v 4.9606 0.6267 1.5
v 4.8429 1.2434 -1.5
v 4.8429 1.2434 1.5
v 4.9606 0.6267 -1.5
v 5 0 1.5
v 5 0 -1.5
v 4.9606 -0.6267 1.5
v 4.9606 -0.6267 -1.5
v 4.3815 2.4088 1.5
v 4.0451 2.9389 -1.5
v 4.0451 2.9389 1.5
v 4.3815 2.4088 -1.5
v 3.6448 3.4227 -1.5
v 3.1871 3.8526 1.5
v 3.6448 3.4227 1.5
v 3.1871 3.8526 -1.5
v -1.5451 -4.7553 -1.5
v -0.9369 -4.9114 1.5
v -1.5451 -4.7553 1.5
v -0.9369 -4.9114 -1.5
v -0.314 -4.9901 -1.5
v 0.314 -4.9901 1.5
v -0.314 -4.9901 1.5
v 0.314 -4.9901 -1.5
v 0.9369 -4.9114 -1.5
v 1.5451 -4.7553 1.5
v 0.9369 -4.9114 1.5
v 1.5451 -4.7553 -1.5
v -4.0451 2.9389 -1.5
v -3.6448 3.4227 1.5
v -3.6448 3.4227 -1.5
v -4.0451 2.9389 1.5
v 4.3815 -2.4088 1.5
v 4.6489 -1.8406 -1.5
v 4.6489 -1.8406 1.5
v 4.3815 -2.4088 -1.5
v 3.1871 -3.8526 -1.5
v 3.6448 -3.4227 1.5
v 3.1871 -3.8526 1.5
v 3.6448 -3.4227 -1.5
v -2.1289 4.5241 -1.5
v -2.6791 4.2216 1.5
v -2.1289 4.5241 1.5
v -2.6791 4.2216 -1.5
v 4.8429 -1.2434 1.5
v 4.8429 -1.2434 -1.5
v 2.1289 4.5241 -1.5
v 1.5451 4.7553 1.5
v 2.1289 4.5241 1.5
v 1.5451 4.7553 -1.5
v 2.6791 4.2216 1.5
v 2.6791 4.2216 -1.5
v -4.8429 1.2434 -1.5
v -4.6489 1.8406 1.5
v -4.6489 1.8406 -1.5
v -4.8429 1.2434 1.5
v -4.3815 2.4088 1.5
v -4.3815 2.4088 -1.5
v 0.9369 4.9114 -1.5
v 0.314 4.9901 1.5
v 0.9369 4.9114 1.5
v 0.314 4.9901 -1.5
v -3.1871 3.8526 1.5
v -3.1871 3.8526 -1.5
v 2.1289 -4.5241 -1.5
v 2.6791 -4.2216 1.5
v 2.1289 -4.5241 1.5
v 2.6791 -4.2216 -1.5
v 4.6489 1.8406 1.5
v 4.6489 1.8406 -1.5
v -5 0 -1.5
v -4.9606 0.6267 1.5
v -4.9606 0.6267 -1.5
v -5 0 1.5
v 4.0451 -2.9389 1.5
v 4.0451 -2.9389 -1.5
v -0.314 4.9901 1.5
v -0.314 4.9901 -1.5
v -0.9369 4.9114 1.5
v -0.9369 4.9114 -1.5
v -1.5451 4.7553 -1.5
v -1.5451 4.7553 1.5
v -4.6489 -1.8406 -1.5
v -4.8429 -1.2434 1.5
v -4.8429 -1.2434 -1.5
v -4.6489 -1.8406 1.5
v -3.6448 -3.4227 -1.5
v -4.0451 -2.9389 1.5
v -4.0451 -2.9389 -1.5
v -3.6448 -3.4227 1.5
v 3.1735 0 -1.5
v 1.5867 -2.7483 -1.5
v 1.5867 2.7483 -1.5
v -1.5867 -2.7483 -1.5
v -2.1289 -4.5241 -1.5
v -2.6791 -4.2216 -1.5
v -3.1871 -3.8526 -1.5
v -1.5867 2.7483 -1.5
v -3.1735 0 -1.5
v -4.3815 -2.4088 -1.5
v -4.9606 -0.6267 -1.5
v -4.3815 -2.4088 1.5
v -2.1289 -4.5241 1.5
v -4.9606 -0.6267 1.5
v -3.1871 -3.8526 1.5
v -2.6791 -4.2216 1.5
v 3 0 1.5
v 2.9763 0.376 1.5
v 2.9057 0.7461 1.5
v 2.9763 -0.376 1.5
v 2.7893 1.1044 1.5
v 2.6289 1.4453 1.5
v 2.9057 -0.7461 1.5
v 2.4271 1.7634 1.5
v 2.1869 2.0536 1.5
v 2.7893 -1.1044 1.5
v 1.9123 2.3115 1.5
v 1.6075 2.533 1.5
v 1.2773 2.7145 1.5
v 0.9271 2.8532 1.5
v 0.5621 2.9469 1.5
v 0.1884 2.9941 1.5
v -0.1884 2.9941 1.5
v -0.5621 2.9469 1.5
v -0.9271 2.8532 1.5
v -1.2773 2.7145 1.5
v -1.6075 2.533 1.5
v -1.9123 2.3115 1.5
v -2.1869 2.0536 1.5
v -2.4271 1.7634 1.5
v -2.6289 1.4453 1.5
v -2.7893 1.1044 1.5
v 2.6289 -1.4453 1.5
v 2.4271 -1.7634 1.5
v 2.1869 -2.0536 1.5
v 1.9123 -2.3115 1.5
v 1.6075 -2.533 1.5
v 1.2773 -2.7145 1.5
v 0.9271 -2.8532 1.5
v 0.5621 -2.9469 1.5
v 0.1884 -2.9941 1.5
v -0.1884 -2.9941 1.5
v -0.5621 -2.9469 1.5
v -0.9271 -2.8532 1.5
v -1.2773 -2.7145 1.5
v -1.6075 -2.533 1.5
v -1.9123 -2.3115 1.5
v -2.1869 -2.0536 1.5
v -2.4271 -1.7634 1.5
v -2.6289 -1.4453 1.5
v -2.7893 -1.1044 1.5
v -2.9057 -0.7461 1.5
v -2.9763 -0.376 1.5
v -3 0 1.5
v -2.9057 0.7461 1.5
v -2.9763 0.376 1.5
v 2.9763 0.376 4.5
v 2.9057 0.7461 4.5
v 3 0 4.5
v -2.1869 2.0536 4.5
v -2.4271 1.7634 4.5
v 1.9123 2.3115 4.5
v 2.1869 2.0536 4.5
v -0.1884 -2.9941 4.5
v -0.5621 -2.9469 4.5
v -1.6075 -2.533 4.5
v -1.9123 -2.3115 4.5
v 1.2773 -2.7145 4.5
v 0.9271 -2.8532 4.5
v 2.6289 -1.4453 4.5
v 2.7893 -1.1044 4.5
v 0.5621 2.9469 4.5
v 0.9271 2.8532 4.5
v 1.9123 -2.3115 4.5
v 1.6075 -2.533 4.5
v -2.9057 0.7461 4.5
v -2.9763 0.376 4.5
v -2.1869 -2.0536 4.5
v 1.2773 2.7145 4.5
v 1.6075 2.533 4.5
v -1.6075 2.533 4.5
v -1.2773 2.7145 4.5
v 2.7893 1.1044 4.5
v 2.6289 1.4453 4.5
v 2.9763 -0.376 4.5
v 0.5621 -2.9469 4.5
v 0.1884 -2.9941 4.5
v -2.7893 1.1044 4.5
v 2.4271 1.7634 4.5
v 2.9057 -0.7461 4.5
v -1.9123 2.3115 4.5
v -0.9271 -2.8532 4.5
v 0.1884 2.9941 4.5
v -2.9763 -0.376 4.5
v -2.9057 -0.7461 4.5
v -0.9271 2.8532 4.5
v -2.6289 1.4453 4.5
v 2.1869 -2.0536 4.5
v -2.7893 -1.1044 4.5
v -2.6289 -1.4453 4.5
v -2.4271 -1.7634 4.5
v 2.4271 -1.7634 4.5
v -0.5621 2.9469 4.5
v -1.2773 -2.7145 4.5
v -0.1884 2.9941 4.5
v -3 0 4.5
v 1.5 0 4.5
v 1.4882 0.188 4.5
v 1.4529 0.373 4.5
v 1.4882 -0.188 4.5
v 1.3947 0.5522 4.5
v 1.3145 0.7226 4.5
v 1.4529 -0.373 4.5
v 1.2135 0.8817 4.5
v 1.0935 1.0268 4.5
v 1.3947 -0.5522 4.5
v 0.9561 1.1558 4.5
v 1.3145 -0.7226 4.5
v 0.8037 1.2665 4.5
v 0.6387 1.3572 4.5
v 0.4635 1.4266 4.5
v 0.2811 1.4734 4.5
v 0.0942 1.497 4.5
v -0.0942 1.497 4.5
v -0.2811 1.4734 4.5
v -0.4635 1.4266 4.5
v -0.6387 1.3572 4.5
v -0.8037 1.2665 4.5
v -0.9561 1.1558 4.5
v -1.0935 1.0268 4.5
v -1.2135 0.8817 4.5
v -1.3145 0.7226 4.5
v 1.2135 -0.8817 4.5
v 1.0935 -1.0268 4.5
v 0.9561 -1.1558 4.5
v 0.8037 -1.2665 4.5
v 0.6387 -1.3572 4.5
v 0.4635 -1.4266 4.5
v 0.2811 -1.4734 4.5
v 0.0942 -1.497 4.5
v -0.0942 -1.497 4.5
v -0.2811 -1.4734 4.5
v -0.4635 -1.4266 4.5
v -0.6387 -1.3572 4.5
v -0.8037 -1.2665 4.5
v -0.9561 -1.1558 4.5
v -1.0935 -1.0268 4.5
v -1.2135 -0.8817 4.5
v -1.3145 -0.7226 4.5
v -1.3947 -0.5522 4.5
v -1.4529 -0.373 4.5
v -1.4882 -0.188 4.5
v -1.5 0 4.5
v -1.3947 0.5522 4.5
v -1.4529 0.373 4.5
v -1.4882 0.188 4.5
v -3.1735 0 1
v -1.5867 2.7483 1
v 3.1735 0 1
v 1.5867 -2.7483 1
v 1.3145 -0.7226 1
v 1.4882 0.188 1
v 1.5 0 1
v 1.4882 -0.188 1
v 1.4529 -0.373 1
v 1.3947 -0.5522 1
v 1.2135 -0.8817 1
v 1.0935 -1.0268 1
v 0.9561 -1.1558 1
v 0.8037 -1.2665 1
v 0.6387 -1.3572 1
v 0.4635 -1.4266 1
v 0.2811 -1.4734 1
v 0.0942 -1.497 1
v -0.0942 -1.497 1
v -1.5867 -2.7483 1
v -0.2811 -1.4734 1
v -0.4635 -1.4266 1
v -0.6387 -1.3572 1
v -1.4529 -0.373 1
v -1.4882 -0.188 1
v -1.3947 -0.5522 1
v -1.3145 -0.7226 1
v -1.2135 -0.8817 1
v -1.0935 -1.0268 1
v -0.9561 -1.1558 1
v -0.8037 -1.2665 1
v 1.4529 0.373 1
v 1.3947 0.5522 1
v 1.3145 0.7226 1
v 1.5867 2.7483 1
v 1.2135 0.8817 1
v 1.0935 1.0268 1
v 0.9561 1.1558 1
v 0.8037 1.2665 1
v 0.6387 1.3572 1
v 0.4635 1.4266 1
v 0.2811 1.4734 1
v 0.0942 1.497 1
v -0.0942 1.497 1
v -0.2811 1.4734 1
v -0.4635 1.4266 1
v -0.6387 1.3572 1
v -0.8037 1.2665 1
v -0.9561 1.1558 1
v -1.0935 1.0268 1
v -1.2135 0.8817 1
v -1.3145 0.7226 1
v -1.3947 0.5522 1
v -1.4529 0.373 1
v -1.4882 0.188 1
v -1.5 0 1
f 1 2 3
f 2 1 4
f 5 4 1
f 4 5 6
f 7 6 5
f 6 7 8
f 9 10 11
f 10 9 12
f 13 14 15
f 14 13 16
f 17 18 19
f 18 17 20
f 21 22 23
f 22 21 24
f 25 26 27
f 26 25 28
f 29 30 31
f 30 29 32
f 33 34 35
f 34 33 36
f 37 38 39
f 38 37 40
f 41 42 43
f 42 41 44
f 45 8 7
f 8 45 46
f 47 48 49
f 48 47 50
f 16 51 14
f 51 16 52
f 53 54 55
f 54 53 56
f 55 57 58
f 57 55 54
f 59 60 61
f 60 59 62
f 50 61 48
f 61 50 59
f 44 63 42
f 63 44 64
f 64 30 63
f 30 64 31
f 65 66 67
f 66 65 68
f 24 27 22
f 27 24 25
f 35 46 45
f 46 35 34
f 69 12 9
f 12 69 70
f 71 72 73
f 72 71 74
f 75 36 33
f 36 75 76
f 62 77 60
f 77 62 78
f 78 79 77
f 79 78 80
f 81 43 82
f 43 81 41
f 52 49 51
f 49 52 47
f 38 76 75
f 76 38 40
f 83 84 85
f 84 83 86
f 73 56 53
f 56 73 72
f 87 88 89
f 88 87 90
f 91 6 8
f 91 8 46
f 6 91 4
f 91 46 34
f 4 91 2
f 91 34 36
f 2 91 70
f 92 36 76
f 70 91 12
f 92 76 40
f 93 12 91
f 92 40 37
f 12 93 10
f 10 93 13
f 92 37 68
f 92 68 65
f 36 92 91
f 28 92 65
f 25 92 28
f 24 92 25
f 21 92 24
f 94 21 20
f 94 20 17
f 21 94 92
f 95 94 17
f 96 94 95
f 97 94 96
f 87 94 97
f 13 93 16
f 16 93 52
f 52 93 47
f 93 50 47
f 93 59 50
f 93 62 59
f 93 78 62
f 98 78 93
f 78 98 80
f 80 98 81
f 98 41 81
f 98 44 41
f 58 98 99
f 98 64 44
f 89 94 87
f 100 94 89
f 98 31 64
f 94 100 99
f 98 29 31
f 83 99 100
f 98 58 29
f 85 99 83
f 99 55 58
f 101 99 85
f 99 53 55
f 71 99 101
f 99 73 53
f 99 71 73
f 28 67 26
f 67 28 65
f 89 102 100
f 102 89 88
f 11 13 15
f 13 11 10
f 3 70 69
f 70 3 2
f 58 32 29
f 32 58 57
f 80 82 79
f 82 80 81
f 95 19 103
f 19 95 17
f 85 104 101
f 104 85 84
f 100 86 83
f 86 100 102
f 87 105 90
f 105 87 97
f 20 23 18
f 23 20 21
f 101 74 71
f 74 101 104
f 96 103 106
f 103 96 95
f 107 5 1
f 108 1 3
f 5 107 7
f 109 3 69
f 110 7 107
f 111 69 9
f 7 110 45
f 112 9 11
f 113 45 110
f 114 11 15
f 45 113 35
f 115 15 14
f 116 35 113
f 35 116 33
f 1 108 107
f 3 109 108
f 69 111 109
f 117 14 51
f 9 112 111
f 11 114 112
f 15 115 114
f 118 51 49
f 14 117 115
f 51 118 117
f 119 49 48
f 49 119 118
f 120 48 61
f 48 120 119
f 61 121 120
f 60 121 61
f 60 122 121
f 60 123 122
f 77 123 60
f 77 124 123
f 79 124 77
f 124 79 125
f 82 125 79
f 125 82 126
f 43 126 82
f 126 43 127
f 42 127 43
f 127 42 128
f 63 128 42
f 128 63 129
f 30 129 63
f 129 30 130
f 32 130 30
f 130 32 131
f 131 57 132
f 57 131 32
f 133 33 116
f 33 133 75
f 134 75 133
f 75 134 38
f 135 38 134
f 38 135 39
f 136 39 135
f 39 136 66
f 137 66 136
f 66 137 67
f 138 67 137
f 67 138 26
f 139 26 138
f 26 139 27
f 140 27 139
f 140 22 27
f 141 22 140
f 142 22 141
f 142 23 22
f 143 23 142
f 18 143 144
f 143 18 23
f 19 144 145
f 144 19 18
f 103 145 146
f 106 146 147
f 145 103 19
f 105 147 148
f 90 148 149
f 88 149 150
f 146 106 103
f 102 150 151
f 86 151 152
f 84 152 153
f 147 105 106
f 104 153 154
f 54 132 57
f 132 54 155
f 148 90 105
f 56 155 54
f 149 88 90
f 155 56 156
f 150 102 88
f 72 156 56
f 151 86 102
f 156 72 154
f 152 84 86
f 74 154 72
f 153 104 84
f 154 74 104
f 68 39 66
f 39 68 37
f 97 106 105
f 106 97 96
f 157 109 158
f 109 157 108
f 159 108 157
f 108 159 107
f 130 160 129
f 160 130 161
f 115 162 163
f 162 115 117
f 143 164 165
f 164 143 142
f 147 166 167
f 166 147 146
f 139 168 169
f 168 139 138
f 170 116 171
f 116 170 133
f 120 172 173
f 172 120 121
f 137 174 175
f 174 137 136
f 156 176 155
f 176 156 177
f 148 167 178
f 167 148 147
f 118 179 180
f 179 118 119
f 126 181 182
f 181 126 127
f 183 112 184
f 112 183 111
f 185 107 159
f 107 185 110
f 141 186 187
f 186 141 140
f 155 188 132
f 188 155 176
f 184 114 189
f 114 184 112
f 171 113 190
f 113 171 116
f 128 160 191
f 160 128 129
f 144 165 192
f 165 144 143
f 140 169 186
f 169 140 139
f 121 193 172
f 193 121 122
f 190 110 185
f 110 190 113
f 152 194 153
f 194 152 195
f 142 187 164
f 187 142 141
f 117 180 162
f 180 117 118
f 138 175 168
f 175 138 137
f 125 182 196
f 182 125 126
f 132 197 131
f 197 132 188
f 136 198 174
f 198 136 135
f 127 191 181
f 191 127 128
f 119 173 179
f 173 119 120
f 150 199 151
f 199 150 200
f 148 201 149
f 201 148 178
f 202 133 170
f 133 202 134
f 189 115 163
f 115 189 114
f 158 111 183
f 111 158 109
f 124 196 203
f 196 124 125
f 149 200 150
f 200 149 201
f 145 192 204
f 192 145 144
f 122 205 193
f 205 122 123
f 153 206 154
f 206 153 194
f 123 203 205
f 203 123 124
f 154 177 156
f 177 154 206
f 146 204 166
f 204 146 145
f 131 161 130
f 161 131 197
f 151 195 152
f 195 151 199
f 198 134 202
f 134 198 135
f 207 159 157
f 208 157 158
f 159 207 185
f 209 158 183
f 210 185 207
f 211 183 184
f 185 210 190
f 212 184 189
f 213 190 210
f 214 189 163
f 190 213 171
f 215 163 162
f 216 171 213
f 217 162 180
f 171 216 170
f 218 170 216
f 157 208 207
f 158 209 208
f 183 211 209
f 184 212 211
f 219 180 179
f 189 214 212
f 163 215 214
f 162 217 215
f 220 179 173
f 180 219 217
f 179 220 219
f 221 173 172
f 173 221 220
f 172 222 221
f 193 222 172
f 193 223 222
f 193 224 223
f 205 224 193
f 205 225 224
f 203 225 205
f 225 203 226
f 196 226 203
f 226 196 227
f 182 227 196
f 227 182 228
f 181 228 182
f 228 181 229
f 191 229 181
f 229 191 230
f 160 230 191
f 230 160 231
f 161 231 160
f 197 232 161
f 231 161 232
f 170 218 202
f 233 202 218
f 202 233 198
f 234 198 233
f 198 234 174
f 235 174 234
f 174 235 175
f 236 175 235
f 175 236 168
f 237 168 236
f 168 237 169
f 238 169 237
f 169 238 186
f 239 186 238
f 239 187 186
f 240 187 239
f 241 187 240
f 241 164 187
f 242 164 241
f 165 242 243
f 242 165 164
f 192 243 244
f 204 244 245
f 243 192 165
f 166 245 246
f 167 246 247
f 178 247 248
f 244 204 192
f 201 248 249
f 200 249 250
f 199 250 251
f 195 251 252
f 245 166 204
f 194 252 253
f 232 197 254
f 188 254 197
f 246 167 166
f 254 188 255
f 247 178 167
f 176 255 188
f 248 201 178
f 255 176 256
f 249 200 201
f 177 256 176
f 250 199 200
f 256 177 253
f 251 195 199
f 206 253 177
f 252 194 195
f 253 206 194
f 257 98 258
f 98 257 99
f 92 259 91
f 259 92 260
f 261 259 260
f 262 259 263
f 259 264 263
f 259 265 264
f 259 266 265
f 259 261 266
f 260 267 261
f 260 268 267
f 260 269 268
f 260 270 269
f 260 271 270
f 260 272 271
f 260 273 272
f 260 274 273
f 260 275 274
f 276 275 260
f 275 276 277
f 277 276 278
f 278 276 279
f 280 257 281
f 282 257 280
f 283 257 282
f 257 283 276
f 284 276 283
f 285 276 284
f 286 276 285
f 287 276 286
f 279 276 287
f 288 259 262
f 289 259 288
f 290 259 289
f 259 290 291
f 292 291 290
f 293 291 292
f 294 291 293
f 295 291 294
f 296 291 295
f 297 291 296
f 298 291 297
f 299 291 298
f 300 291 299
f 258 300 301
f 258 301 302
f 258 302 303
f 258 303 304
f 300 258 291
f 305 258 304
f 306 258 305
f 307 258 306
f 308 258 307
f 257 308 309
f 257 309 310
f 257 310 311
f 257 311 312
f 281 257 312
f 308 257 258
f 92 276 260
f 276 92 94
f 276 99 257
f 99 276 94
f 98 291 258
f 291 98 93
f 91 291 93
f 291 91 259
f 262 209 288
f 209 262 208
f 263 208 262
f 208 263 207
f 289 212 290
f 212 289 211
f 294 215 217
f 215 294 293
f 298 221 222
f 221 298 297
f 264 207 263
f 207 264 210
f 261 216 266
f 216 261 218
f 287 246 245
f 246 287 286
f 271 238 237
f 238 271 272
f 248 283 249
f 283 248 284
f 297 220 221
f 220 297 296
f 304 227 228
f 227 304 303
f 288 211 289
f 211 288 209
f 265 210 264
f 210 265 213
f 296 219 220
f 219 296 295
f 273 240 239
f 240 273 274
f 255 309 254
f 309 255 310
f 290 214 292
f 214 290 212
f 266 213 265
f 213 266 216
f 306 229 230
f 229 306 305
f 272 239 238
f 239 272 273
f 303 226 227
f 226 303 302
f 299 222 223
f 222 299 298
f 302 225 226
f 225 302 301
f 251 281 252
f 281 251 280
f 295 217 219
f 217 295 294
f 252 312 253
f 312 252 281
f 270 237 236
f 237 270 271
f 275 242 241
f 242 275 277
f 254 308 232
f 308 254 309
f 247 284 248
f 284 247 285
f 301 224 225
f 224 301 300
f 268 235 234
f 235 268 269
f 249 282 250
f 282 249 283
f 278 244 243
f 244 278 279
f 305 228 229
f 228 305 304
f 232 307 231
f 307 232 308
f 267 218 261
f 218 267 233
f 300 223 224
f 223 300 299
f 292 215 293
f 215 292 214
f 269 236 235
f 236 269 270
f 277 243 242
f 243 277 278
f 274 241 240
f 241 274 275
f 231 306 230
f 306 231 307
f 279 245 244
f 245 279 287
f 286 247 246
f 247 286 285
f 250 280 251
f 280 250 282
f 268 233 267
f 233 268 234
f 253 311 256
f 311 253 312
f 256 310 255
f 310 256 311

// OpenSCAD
$fn = 50;


difference() {
	union() {
		translate(v = [0, 0, -1.5000000000]) {
			cylinder(h = 3, r = 5.0000000000);
		}
		translate(v = [0, 0, -1.5000000000]) {
			cylinder(h = 6, r = 3.0000000000);
		}
	}
	union() {
		translate(v = [0, 0, -1.5000000000]) {
			rotate(a = [0, 0, 0]) {
				difference() {
					union() {
						linear_extrude(height = 2.5000000000) {
							polygon(points = [[3.1735000000, 0.0000000000], [1.5867500000, 2.7483316189], [-1.5867500000, 2.7483316189], [-3.1735000000, 0.0000000000], [-1.5867500000, -2.7483316189], [1.5867500000, -2.7483316189]]);
						}
					}
					union();
				}
			}
		}
		translate(v = [0, 0, -100.0000000000]) {
			cylinder(h = 200, r = 1.5000000000);
		}
	}
}
